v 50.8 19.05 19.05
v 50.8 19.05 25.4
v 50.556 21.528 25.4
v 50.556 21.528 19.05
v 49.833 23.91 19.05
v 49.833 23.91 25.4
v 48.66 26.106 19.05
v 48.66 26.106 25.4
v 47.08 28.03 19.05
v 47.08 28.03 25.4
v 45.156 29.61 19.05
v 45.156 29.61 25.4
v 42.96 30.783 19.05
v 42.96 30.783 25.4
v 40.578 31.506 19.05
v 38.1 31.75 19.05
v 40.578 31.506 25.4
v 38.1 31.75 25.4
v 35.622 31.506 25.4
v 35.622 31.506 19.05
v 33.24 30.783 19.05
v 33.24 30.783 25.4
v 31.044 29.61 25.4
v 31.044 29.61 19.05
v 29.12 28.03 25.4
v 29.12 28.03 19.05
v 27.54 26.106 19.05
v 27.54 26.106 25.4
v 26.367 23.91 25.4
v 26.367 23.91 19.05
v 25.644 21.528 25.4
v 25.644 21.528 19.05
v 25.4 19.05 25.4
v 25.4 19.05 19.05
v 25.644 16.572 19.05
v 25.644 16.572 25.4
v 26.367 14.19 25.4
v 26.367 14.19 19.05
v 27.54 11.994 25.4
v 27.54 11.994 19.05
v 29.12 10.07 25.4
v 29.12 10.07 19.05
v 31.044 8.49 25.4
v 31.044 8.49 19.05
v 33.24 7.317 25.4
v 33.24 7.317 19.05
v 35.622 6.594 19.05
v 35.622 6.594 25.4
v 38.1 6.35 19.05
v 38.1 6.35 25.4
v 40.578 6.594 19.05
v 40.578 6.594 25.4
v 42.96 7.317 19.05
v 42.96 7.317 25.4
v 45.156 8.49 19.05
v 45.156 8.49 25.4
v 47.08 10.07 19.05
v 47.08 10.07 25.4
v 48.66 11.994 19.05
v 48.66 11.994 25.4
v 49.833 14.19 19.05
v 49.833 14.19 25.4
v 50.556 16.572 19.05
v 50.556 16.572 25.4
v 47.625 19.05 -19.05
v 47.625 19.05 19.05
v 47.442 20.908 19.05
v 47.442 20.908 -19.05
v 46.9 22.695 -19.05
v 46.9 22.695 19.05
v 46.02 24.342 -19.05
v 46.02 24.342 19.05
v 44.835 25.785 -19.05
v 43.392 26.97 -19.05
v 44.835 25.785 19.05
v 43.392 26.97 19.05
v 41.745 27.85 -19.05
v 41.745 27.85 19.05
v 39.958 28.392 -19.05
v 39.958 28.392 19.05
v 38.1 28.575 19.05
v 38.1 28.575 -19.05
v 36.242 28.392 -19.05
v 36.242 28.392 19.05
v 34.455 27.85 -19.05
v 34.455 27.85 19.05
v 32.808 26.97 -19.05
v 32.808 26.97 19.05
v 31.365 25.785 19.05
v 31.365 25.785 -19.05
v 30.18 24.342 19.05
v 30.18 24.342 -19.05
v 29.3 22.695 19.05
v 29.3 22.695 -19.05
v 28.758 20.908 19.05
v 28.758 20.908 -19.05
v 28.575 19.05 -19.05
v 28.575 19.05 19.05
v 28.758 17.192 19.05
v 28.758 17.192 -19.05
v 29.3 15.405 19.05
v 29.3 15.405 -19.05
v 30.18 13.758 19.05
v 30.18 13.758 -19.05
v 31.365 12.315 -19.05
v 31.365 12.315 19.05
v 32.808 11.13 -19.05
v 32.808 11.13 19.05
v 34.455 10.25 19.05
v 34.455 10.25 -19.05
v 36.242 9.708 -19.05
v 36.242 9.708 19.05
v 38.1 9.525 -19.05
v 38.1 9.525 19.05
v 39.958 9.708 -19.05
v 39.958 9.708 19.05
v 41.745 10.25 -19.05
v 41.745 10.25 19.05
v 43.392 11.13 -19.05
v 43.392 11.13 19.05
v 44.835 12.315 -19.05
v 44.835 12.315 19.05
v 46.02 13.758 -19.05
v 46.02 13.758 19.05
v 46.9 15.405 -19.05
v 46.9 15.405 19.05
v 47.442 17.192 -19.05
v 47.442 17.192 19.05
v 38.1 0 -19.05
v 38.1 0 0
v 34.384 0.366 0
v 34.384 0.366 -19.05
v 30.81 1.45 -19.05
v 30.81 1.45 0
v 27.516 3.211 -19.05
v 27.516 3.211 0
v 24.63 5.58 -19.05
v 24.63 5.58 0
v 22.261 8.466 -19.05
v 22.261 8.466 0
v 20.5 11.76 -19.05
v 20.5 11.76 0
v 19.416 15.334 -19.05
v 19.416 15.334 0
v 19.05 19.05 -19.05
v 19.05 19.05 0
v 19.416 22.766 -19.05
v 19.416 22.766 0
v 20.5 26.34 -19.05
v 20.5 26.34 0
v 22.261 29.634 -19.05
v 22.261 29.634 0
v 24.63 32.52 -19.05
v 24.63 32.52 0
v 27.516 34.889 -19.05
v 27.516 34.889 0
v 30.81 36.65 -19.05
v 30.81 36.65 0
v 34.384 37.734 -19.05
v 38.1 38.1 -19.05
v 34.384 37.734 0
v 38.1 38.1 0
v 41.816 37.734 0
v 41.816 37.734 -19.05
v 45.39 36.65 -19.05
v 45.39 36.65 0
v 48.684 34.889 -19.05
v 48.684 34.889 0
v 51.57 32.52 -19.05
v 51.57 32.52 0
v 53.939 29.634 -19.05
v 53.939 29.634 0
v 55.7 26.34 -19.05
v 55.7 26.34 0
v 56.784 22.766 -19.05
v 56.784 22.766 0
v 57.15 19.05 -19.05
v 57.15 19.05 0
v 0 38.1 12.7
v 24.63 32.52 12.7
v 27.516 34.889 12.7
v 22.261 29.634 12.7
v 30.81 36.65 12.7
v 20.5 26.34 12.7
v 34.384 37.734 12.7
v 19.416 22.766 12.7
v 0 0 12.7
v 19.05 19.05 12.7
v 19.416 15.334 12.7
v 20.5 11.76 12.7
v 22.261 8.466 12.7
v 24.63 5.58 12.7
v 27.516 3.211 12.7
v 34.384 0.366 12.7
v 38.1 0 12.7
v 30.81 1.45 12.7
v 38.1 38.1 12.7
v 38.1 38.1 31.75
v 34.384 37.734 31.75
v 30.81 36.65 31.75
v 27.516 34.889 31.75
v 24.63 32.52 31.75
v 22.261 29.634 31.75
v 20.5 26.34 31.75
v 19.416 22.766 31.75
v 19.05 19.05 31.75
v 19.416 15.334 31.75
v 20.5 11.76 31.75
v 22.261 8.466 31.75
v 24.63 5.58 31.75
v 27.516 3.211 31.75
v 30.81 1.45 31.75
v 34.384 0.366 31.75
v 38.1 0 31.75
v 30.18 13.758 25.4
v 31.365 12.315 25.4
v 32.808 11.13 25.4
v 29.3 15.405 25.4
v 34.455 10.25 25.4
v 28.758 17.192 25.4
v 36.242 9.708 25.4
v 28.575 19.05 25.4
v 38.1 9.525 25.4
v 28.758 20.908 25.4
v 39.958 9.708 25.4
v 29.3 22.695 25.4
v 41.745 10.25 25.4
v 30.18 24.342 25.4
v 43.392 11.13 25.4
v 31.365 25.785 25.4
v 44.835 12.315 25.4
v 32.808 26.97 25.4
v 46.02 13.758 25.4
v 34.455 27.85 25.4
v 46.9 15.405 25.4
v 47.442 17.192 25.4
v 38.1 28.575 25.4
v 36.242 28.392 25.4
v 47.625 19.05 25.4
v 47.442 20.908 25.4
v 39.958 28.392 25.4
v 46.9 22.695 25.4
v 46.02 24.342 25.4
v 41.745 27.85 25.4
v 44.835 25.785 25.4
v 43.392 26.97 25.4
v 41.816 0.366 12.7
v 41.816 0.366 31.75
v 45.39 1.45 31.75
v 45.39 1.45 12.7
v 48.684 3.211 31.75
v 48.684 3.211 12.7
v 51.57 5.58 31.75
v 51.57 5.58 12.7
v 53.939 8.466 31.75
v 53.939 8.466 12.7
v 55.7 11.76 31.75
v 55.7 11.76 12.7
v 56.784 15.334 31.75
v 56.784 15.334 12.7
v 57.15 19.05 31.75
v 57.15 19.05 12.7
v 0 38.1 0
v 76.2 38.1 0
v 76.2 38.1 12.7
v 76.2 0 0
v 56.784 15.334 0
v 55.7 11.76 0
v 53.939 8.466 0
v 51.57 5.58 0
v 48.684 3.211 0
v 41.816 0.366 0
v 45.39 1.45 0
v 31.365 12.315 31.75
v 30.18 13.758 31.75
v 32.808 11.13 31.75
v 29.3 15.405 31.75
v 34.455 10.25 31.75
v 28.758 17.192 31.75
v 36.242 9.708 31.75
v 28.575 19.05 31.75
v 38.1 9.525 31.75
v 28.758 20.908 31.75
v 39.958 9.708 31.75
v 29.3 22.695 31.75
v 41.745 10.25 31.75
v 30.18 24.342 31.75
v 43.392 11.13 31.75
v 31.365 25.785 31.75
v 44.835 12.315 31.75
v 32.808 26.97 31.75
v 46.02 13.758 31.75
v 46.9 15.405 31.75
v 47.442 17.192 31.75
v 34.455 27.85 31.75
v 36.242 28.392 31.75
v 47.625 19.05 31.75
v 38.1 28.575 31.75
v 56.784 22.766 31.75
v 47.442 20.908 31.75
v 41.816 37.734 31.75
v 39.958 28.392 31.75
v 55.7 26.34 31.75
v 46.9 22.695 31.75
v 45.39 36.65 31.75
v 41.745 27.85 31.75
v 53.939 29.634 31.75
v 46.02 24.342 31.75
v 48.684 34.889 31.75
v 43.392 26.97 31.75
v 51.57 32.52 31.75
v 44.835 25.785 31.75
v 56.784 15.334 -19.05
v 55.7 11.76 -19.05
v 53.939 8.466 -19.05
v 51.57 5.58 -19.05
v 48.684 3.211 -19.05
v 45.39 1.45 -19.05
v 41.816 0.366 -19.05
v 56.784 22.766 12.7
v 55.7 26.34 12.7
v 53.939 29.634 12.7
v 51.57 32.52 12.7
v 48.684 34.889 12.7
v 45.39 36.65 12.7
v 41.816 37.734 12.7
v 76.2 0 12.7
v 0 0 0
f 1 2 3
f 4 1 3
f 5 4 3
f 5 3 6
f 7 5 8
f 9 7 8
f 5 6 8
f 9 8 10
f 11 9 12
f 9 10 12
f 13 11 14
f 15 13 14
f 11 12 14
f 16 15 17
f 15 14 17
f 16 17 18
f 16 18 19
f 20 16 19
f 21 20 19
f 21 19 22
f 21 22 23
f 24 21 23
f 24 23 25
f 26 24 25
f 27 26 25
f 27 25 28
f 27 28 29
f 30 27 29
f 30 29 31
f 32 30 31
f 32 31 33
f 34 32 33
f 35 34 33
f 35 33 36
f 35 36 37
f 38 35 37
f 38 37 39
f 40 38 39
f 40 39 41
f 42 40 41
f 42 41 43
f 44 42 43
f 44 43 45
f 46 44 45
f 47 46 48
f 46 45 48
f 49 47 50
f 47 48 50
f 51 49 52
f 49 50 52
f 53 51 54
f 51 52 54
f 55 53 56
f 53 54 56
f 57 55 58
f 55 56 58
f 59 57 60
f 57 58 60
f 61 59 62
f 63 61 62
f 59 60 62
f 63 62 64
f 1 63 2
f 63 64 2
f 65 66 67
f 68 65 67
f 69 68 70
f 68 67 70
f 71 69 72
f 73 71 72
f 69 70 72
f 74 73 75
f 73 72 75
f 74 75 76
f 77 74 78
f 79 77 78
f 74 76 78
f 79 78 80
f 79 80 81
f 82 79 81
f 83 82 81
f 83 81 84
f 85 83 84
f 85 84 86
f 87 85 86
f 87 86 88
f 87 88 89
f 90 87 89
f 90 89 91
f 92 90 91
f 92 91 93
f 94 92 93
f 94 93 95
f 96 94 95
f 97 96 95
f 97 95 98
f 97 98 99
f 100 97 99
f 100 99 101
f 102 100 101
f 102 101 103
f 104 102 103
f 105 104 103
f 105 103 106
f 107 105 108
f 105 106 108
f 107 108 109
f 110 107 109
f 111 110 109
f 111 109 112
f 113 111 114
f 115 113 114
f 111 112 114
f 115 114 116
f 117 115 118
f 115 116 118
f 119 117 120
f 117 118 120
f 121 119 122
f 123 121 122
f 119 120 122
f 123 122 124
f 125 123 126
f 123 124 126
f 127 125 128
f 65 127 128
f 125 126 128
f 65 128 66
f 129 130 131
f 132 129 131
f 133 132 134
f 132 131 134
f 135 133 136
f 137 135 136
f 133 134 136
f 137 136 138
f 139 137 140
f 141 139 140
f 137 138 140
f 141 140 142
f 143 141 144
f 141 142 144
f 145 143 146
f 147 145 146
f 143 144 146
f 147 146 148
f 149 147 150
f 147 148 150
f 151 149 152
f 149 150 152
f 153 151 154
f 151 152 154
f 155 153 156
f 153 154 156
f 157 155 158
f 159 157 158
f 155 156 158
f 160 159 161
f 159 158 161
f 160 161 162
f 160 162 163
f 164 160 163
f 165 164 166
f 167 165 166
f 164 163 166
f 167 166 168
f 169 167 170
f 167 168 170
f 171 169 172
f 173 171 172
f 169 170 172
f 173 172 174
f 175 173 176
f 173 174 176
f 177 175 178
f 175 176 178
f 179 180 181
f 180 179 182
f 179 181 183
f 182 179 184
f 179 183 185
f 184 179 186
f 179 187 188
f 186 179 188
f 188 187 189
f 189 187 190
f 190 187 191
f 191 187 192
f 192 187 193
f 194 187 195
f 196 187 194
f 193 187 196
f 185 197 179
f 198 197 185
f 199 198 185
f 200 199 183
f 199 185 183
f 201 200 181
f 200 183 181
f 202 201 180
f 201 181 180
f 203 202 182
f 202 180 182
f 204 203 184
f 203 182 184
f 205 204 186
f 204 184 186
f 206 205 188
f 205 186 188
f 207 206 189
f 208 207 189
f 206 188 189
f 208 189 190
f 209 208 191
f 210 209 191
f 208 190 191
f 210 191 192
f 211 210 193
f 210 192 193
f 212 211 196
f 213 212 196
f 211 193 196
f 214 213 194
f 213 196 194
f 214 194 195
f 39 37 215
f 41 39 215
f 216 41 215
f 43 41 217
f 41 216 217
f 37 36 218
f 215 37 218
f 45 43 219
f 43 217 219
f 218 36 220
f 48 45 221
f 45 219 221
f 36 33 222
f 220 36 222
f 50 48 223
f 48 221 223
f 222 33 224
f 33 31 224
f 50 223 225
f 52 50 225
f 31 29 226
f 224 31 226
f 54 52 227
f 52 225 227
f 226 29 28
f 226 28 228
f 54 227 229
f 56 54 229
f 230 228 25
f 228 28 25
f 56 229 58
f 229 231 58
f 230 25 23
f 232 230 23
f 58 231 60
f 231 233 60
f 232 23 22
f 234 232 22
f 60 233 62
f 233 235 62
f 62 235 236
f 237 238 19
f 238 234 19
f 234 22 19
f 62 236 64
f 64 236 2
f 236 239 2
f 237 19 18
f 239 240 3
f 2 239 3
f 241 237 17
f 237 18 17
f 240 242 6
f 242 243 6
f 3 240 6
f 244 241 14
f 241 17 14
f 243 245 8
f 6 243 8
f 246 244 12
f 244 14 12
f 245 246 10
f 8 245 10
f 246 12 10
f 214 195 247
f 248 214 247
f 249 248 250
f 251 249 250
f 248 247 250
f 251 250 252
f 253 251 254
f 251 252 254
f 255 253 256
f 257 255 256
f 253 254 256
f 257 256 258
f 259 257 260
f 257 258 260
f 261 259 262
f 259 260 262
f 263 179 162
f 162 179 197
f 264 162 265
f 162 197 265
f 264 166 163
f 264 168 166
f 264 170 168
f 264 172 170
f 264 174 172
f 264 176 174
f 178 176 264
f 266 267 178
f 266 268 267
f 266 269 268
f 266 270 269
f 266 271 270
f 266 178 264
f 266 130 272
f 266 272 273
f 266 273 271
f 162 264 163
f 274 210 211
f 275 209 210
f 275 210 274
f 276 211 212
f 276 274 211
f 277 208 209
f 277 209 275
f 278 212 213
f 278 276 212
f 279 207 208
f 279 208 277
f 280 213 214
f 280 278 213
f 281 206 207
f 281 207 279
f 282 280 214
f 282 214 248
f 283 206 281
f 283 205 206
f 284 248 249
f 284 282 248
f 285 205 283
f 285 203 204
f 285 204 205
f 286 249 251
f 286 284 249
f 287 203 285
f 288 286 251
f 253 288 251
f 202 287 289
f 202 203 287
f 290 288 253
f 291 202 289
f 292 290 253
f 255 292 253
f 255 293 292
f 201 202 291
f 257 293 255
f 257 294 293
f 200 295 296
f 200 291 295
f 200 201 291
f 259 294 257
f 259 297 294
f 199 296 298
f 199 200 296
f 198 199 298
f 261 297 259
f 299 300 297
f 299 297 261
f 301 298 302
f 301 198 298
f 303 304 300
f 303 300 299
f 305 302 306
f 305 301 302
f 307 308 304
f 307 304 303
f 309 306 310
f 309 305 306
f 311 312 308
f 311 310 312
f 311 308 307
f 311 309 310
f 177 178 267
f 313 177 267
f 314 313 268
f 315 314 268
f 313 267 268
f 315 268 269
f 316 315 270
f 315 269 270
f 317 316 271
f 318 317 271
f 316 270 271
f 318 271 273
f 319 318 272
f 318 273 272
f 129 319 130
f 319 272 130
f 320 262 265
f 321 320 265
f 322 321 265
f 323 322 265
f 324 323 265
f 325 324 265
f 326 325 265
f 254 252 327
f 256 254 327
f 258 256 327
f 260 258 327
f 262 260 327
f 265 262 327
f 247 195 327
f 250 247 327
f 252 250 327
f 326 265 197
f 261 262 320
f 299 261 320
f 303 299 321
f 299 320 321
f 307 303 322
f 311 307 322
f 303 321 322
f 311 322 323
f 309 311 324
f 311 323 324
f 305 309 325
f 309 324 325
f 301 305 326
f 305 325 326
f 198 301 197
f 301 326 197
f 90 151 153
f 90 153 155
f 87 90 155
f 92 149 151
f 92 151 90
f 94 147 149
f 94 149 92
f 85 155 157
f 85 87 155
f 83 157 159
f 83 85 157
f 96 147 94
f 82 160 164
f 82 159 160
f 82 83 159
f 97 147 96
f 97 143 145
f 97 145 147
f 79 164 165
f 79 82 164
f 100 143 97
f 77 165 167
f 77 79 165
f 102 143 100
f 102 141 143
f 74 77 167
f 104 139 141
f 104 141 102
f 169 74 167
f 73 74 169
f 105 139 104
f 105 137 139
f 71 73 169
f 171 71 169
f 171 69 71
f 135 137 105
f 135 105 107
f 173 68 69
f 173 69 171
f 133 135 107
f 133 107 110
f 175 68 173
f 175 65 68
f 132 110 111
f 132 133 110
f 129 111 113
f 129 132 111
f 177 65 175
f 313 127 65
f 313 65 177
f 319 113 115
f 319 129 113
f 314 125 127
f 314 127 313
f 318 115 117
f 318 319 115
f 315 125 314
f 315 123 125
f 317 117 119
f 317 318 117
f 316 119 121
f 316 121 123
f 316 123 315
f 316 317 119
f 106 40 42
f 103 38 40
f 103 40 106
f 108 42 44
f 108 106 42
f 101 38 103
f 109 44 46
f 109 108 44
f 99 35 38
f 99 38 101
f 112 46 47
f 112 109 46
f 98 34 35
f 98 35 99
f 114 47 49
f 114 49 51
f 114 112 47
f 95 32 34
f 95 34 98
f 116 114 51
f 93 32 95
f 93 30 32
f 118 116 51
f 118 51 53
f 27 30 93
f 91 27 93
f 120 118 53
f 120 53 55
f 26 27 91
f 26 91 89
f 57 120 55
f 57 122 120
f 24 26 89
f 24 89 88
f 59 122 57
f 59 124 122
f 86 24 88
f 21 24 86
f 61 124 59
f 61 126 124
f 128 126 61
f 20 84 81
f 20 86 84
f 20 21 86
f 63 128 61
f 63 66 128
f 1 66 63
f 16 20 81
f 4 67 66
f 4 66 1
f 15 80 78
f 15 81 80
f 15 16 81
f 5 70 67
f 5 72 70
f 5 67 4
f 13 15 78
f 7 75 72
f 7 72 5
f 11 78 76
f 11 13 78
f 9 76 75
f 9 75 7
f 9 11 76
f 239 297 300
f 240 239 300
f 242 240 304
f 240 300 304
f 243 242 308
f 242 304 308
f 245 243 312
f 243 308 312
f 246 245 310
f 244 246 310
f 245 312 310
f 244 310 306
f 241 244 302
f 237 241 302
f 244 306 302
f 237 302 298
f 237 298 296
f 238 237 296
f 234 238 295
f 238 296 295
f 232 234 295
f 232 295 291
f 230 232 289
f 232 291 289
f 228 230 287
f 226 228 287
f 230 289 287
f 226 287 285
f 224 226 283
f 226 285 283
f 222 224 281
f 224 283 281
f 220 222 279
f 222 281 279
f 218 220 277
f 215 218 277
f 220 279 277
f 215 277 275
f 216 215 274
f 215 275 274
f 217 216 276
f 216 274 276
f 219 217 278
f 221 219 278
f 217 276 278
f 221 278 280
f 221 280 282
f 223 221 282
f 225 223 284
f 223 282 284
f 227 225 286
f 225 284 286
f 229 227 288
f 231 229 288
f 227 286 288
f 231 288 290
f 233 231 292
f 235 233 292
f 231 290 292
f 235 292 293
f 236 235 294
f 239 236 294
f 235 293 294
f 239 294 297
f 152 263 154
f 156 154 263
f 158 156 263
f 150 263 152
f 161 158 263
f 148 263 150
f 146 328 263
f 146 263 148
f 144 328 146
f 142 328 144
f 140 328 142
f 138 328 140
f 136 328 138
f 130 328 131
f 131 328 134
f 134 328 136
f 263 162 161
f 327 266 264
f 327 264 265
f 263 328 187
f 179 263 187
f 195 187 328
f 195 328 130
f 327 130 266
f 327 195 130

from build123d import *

# Parameters (mm, degrees)
F0_W      = 76.2
F0_H      = 12.7
F1_DEPTH  = 38.1
F4_DEPTH  = 19.05
F5_DEPTH  = 19.05
F6_R      = 9.525
F7_DEPTH  = 127
F8_R      = 12.7
F9_DEPTH  = 12.7
F10_R     = 12.7
F10_R_2   = 9.525
F11_DEPTH = 6.35


with BuildPart() as f1:
    # F0 (on Front) → F1 (new body)
    with BuildSketch(Plane.XZ):
        with Locations((38.1, 6.35)):
            Rectangle(F0_W, F0_H)
    extrude(amount=-F1_DEPTH)

    # F2 (on face) → F4 (join)
    with BuildSketch(Plane.XY.offset(12.7)):
        with BuildLine():
            ThreePointArc((38.1, 0), (51.570384, 5.579616), (57.15, 19.05))
            ThreePointArc((57.15, 19.05), (51.570384, 32.520384), (38.1, 38.1))
            ThreePointArc((38.1, 38.1), (19.05, 19.05), (38.1, 0))
        make_face()
    extrude(amount=F4_DEPTH)

    # F3 (on face) → F5 (join)
    with BuildSketch(Plane(origin=(0, 0, 0), x_dir=(1, 0, 0), z_dir=(0, 0, -1))):
        with BuildLine():
            ThreePointArc((38.1, -38.1), (51.570384, -32.520384), (57.15, -19.05))
            ThreePointArc((57.15, -19.05), (51.570384, -5.579616), (38.1, 0))
            ThreePointArc((38.1, 0), (19.05, -19.05), (38.1, -38.1))
        make_face()
    extrude(amount=F5_DEPTH)

    # F6 (on face) → F7 (cut)
    with BuildSketch(Plane.XY.offset(31.75)):
        with Locations((38.1, 19.05)):
            Circle(F6_R)
    extrude(amount=-F7_DEPTH, mode=Mode.SUBTRACT)

    # F8 (on face) → F9 (cut)
    with BuildSketch(Plane.XY.offset(31.75)):
        with Locations((38.1, 19.05)):
            Circle(F8_R)
    extrude(amount=-F9_DEPTH, mode=Mode.SUBTRACT)

    # F10 (on face) → F11 (join)
    with BuildSketch(Plane.XY.offset(31.75)):
        with Locations((38.1, 19.05)):
            Circle(F10_R)
        with Locations((38.1, 19.05)):
            Circle(F10_R_2, mode=Mode.SUBTRACT)
    extrude(amount=-F11_DEPTH)


solid = f1.part
